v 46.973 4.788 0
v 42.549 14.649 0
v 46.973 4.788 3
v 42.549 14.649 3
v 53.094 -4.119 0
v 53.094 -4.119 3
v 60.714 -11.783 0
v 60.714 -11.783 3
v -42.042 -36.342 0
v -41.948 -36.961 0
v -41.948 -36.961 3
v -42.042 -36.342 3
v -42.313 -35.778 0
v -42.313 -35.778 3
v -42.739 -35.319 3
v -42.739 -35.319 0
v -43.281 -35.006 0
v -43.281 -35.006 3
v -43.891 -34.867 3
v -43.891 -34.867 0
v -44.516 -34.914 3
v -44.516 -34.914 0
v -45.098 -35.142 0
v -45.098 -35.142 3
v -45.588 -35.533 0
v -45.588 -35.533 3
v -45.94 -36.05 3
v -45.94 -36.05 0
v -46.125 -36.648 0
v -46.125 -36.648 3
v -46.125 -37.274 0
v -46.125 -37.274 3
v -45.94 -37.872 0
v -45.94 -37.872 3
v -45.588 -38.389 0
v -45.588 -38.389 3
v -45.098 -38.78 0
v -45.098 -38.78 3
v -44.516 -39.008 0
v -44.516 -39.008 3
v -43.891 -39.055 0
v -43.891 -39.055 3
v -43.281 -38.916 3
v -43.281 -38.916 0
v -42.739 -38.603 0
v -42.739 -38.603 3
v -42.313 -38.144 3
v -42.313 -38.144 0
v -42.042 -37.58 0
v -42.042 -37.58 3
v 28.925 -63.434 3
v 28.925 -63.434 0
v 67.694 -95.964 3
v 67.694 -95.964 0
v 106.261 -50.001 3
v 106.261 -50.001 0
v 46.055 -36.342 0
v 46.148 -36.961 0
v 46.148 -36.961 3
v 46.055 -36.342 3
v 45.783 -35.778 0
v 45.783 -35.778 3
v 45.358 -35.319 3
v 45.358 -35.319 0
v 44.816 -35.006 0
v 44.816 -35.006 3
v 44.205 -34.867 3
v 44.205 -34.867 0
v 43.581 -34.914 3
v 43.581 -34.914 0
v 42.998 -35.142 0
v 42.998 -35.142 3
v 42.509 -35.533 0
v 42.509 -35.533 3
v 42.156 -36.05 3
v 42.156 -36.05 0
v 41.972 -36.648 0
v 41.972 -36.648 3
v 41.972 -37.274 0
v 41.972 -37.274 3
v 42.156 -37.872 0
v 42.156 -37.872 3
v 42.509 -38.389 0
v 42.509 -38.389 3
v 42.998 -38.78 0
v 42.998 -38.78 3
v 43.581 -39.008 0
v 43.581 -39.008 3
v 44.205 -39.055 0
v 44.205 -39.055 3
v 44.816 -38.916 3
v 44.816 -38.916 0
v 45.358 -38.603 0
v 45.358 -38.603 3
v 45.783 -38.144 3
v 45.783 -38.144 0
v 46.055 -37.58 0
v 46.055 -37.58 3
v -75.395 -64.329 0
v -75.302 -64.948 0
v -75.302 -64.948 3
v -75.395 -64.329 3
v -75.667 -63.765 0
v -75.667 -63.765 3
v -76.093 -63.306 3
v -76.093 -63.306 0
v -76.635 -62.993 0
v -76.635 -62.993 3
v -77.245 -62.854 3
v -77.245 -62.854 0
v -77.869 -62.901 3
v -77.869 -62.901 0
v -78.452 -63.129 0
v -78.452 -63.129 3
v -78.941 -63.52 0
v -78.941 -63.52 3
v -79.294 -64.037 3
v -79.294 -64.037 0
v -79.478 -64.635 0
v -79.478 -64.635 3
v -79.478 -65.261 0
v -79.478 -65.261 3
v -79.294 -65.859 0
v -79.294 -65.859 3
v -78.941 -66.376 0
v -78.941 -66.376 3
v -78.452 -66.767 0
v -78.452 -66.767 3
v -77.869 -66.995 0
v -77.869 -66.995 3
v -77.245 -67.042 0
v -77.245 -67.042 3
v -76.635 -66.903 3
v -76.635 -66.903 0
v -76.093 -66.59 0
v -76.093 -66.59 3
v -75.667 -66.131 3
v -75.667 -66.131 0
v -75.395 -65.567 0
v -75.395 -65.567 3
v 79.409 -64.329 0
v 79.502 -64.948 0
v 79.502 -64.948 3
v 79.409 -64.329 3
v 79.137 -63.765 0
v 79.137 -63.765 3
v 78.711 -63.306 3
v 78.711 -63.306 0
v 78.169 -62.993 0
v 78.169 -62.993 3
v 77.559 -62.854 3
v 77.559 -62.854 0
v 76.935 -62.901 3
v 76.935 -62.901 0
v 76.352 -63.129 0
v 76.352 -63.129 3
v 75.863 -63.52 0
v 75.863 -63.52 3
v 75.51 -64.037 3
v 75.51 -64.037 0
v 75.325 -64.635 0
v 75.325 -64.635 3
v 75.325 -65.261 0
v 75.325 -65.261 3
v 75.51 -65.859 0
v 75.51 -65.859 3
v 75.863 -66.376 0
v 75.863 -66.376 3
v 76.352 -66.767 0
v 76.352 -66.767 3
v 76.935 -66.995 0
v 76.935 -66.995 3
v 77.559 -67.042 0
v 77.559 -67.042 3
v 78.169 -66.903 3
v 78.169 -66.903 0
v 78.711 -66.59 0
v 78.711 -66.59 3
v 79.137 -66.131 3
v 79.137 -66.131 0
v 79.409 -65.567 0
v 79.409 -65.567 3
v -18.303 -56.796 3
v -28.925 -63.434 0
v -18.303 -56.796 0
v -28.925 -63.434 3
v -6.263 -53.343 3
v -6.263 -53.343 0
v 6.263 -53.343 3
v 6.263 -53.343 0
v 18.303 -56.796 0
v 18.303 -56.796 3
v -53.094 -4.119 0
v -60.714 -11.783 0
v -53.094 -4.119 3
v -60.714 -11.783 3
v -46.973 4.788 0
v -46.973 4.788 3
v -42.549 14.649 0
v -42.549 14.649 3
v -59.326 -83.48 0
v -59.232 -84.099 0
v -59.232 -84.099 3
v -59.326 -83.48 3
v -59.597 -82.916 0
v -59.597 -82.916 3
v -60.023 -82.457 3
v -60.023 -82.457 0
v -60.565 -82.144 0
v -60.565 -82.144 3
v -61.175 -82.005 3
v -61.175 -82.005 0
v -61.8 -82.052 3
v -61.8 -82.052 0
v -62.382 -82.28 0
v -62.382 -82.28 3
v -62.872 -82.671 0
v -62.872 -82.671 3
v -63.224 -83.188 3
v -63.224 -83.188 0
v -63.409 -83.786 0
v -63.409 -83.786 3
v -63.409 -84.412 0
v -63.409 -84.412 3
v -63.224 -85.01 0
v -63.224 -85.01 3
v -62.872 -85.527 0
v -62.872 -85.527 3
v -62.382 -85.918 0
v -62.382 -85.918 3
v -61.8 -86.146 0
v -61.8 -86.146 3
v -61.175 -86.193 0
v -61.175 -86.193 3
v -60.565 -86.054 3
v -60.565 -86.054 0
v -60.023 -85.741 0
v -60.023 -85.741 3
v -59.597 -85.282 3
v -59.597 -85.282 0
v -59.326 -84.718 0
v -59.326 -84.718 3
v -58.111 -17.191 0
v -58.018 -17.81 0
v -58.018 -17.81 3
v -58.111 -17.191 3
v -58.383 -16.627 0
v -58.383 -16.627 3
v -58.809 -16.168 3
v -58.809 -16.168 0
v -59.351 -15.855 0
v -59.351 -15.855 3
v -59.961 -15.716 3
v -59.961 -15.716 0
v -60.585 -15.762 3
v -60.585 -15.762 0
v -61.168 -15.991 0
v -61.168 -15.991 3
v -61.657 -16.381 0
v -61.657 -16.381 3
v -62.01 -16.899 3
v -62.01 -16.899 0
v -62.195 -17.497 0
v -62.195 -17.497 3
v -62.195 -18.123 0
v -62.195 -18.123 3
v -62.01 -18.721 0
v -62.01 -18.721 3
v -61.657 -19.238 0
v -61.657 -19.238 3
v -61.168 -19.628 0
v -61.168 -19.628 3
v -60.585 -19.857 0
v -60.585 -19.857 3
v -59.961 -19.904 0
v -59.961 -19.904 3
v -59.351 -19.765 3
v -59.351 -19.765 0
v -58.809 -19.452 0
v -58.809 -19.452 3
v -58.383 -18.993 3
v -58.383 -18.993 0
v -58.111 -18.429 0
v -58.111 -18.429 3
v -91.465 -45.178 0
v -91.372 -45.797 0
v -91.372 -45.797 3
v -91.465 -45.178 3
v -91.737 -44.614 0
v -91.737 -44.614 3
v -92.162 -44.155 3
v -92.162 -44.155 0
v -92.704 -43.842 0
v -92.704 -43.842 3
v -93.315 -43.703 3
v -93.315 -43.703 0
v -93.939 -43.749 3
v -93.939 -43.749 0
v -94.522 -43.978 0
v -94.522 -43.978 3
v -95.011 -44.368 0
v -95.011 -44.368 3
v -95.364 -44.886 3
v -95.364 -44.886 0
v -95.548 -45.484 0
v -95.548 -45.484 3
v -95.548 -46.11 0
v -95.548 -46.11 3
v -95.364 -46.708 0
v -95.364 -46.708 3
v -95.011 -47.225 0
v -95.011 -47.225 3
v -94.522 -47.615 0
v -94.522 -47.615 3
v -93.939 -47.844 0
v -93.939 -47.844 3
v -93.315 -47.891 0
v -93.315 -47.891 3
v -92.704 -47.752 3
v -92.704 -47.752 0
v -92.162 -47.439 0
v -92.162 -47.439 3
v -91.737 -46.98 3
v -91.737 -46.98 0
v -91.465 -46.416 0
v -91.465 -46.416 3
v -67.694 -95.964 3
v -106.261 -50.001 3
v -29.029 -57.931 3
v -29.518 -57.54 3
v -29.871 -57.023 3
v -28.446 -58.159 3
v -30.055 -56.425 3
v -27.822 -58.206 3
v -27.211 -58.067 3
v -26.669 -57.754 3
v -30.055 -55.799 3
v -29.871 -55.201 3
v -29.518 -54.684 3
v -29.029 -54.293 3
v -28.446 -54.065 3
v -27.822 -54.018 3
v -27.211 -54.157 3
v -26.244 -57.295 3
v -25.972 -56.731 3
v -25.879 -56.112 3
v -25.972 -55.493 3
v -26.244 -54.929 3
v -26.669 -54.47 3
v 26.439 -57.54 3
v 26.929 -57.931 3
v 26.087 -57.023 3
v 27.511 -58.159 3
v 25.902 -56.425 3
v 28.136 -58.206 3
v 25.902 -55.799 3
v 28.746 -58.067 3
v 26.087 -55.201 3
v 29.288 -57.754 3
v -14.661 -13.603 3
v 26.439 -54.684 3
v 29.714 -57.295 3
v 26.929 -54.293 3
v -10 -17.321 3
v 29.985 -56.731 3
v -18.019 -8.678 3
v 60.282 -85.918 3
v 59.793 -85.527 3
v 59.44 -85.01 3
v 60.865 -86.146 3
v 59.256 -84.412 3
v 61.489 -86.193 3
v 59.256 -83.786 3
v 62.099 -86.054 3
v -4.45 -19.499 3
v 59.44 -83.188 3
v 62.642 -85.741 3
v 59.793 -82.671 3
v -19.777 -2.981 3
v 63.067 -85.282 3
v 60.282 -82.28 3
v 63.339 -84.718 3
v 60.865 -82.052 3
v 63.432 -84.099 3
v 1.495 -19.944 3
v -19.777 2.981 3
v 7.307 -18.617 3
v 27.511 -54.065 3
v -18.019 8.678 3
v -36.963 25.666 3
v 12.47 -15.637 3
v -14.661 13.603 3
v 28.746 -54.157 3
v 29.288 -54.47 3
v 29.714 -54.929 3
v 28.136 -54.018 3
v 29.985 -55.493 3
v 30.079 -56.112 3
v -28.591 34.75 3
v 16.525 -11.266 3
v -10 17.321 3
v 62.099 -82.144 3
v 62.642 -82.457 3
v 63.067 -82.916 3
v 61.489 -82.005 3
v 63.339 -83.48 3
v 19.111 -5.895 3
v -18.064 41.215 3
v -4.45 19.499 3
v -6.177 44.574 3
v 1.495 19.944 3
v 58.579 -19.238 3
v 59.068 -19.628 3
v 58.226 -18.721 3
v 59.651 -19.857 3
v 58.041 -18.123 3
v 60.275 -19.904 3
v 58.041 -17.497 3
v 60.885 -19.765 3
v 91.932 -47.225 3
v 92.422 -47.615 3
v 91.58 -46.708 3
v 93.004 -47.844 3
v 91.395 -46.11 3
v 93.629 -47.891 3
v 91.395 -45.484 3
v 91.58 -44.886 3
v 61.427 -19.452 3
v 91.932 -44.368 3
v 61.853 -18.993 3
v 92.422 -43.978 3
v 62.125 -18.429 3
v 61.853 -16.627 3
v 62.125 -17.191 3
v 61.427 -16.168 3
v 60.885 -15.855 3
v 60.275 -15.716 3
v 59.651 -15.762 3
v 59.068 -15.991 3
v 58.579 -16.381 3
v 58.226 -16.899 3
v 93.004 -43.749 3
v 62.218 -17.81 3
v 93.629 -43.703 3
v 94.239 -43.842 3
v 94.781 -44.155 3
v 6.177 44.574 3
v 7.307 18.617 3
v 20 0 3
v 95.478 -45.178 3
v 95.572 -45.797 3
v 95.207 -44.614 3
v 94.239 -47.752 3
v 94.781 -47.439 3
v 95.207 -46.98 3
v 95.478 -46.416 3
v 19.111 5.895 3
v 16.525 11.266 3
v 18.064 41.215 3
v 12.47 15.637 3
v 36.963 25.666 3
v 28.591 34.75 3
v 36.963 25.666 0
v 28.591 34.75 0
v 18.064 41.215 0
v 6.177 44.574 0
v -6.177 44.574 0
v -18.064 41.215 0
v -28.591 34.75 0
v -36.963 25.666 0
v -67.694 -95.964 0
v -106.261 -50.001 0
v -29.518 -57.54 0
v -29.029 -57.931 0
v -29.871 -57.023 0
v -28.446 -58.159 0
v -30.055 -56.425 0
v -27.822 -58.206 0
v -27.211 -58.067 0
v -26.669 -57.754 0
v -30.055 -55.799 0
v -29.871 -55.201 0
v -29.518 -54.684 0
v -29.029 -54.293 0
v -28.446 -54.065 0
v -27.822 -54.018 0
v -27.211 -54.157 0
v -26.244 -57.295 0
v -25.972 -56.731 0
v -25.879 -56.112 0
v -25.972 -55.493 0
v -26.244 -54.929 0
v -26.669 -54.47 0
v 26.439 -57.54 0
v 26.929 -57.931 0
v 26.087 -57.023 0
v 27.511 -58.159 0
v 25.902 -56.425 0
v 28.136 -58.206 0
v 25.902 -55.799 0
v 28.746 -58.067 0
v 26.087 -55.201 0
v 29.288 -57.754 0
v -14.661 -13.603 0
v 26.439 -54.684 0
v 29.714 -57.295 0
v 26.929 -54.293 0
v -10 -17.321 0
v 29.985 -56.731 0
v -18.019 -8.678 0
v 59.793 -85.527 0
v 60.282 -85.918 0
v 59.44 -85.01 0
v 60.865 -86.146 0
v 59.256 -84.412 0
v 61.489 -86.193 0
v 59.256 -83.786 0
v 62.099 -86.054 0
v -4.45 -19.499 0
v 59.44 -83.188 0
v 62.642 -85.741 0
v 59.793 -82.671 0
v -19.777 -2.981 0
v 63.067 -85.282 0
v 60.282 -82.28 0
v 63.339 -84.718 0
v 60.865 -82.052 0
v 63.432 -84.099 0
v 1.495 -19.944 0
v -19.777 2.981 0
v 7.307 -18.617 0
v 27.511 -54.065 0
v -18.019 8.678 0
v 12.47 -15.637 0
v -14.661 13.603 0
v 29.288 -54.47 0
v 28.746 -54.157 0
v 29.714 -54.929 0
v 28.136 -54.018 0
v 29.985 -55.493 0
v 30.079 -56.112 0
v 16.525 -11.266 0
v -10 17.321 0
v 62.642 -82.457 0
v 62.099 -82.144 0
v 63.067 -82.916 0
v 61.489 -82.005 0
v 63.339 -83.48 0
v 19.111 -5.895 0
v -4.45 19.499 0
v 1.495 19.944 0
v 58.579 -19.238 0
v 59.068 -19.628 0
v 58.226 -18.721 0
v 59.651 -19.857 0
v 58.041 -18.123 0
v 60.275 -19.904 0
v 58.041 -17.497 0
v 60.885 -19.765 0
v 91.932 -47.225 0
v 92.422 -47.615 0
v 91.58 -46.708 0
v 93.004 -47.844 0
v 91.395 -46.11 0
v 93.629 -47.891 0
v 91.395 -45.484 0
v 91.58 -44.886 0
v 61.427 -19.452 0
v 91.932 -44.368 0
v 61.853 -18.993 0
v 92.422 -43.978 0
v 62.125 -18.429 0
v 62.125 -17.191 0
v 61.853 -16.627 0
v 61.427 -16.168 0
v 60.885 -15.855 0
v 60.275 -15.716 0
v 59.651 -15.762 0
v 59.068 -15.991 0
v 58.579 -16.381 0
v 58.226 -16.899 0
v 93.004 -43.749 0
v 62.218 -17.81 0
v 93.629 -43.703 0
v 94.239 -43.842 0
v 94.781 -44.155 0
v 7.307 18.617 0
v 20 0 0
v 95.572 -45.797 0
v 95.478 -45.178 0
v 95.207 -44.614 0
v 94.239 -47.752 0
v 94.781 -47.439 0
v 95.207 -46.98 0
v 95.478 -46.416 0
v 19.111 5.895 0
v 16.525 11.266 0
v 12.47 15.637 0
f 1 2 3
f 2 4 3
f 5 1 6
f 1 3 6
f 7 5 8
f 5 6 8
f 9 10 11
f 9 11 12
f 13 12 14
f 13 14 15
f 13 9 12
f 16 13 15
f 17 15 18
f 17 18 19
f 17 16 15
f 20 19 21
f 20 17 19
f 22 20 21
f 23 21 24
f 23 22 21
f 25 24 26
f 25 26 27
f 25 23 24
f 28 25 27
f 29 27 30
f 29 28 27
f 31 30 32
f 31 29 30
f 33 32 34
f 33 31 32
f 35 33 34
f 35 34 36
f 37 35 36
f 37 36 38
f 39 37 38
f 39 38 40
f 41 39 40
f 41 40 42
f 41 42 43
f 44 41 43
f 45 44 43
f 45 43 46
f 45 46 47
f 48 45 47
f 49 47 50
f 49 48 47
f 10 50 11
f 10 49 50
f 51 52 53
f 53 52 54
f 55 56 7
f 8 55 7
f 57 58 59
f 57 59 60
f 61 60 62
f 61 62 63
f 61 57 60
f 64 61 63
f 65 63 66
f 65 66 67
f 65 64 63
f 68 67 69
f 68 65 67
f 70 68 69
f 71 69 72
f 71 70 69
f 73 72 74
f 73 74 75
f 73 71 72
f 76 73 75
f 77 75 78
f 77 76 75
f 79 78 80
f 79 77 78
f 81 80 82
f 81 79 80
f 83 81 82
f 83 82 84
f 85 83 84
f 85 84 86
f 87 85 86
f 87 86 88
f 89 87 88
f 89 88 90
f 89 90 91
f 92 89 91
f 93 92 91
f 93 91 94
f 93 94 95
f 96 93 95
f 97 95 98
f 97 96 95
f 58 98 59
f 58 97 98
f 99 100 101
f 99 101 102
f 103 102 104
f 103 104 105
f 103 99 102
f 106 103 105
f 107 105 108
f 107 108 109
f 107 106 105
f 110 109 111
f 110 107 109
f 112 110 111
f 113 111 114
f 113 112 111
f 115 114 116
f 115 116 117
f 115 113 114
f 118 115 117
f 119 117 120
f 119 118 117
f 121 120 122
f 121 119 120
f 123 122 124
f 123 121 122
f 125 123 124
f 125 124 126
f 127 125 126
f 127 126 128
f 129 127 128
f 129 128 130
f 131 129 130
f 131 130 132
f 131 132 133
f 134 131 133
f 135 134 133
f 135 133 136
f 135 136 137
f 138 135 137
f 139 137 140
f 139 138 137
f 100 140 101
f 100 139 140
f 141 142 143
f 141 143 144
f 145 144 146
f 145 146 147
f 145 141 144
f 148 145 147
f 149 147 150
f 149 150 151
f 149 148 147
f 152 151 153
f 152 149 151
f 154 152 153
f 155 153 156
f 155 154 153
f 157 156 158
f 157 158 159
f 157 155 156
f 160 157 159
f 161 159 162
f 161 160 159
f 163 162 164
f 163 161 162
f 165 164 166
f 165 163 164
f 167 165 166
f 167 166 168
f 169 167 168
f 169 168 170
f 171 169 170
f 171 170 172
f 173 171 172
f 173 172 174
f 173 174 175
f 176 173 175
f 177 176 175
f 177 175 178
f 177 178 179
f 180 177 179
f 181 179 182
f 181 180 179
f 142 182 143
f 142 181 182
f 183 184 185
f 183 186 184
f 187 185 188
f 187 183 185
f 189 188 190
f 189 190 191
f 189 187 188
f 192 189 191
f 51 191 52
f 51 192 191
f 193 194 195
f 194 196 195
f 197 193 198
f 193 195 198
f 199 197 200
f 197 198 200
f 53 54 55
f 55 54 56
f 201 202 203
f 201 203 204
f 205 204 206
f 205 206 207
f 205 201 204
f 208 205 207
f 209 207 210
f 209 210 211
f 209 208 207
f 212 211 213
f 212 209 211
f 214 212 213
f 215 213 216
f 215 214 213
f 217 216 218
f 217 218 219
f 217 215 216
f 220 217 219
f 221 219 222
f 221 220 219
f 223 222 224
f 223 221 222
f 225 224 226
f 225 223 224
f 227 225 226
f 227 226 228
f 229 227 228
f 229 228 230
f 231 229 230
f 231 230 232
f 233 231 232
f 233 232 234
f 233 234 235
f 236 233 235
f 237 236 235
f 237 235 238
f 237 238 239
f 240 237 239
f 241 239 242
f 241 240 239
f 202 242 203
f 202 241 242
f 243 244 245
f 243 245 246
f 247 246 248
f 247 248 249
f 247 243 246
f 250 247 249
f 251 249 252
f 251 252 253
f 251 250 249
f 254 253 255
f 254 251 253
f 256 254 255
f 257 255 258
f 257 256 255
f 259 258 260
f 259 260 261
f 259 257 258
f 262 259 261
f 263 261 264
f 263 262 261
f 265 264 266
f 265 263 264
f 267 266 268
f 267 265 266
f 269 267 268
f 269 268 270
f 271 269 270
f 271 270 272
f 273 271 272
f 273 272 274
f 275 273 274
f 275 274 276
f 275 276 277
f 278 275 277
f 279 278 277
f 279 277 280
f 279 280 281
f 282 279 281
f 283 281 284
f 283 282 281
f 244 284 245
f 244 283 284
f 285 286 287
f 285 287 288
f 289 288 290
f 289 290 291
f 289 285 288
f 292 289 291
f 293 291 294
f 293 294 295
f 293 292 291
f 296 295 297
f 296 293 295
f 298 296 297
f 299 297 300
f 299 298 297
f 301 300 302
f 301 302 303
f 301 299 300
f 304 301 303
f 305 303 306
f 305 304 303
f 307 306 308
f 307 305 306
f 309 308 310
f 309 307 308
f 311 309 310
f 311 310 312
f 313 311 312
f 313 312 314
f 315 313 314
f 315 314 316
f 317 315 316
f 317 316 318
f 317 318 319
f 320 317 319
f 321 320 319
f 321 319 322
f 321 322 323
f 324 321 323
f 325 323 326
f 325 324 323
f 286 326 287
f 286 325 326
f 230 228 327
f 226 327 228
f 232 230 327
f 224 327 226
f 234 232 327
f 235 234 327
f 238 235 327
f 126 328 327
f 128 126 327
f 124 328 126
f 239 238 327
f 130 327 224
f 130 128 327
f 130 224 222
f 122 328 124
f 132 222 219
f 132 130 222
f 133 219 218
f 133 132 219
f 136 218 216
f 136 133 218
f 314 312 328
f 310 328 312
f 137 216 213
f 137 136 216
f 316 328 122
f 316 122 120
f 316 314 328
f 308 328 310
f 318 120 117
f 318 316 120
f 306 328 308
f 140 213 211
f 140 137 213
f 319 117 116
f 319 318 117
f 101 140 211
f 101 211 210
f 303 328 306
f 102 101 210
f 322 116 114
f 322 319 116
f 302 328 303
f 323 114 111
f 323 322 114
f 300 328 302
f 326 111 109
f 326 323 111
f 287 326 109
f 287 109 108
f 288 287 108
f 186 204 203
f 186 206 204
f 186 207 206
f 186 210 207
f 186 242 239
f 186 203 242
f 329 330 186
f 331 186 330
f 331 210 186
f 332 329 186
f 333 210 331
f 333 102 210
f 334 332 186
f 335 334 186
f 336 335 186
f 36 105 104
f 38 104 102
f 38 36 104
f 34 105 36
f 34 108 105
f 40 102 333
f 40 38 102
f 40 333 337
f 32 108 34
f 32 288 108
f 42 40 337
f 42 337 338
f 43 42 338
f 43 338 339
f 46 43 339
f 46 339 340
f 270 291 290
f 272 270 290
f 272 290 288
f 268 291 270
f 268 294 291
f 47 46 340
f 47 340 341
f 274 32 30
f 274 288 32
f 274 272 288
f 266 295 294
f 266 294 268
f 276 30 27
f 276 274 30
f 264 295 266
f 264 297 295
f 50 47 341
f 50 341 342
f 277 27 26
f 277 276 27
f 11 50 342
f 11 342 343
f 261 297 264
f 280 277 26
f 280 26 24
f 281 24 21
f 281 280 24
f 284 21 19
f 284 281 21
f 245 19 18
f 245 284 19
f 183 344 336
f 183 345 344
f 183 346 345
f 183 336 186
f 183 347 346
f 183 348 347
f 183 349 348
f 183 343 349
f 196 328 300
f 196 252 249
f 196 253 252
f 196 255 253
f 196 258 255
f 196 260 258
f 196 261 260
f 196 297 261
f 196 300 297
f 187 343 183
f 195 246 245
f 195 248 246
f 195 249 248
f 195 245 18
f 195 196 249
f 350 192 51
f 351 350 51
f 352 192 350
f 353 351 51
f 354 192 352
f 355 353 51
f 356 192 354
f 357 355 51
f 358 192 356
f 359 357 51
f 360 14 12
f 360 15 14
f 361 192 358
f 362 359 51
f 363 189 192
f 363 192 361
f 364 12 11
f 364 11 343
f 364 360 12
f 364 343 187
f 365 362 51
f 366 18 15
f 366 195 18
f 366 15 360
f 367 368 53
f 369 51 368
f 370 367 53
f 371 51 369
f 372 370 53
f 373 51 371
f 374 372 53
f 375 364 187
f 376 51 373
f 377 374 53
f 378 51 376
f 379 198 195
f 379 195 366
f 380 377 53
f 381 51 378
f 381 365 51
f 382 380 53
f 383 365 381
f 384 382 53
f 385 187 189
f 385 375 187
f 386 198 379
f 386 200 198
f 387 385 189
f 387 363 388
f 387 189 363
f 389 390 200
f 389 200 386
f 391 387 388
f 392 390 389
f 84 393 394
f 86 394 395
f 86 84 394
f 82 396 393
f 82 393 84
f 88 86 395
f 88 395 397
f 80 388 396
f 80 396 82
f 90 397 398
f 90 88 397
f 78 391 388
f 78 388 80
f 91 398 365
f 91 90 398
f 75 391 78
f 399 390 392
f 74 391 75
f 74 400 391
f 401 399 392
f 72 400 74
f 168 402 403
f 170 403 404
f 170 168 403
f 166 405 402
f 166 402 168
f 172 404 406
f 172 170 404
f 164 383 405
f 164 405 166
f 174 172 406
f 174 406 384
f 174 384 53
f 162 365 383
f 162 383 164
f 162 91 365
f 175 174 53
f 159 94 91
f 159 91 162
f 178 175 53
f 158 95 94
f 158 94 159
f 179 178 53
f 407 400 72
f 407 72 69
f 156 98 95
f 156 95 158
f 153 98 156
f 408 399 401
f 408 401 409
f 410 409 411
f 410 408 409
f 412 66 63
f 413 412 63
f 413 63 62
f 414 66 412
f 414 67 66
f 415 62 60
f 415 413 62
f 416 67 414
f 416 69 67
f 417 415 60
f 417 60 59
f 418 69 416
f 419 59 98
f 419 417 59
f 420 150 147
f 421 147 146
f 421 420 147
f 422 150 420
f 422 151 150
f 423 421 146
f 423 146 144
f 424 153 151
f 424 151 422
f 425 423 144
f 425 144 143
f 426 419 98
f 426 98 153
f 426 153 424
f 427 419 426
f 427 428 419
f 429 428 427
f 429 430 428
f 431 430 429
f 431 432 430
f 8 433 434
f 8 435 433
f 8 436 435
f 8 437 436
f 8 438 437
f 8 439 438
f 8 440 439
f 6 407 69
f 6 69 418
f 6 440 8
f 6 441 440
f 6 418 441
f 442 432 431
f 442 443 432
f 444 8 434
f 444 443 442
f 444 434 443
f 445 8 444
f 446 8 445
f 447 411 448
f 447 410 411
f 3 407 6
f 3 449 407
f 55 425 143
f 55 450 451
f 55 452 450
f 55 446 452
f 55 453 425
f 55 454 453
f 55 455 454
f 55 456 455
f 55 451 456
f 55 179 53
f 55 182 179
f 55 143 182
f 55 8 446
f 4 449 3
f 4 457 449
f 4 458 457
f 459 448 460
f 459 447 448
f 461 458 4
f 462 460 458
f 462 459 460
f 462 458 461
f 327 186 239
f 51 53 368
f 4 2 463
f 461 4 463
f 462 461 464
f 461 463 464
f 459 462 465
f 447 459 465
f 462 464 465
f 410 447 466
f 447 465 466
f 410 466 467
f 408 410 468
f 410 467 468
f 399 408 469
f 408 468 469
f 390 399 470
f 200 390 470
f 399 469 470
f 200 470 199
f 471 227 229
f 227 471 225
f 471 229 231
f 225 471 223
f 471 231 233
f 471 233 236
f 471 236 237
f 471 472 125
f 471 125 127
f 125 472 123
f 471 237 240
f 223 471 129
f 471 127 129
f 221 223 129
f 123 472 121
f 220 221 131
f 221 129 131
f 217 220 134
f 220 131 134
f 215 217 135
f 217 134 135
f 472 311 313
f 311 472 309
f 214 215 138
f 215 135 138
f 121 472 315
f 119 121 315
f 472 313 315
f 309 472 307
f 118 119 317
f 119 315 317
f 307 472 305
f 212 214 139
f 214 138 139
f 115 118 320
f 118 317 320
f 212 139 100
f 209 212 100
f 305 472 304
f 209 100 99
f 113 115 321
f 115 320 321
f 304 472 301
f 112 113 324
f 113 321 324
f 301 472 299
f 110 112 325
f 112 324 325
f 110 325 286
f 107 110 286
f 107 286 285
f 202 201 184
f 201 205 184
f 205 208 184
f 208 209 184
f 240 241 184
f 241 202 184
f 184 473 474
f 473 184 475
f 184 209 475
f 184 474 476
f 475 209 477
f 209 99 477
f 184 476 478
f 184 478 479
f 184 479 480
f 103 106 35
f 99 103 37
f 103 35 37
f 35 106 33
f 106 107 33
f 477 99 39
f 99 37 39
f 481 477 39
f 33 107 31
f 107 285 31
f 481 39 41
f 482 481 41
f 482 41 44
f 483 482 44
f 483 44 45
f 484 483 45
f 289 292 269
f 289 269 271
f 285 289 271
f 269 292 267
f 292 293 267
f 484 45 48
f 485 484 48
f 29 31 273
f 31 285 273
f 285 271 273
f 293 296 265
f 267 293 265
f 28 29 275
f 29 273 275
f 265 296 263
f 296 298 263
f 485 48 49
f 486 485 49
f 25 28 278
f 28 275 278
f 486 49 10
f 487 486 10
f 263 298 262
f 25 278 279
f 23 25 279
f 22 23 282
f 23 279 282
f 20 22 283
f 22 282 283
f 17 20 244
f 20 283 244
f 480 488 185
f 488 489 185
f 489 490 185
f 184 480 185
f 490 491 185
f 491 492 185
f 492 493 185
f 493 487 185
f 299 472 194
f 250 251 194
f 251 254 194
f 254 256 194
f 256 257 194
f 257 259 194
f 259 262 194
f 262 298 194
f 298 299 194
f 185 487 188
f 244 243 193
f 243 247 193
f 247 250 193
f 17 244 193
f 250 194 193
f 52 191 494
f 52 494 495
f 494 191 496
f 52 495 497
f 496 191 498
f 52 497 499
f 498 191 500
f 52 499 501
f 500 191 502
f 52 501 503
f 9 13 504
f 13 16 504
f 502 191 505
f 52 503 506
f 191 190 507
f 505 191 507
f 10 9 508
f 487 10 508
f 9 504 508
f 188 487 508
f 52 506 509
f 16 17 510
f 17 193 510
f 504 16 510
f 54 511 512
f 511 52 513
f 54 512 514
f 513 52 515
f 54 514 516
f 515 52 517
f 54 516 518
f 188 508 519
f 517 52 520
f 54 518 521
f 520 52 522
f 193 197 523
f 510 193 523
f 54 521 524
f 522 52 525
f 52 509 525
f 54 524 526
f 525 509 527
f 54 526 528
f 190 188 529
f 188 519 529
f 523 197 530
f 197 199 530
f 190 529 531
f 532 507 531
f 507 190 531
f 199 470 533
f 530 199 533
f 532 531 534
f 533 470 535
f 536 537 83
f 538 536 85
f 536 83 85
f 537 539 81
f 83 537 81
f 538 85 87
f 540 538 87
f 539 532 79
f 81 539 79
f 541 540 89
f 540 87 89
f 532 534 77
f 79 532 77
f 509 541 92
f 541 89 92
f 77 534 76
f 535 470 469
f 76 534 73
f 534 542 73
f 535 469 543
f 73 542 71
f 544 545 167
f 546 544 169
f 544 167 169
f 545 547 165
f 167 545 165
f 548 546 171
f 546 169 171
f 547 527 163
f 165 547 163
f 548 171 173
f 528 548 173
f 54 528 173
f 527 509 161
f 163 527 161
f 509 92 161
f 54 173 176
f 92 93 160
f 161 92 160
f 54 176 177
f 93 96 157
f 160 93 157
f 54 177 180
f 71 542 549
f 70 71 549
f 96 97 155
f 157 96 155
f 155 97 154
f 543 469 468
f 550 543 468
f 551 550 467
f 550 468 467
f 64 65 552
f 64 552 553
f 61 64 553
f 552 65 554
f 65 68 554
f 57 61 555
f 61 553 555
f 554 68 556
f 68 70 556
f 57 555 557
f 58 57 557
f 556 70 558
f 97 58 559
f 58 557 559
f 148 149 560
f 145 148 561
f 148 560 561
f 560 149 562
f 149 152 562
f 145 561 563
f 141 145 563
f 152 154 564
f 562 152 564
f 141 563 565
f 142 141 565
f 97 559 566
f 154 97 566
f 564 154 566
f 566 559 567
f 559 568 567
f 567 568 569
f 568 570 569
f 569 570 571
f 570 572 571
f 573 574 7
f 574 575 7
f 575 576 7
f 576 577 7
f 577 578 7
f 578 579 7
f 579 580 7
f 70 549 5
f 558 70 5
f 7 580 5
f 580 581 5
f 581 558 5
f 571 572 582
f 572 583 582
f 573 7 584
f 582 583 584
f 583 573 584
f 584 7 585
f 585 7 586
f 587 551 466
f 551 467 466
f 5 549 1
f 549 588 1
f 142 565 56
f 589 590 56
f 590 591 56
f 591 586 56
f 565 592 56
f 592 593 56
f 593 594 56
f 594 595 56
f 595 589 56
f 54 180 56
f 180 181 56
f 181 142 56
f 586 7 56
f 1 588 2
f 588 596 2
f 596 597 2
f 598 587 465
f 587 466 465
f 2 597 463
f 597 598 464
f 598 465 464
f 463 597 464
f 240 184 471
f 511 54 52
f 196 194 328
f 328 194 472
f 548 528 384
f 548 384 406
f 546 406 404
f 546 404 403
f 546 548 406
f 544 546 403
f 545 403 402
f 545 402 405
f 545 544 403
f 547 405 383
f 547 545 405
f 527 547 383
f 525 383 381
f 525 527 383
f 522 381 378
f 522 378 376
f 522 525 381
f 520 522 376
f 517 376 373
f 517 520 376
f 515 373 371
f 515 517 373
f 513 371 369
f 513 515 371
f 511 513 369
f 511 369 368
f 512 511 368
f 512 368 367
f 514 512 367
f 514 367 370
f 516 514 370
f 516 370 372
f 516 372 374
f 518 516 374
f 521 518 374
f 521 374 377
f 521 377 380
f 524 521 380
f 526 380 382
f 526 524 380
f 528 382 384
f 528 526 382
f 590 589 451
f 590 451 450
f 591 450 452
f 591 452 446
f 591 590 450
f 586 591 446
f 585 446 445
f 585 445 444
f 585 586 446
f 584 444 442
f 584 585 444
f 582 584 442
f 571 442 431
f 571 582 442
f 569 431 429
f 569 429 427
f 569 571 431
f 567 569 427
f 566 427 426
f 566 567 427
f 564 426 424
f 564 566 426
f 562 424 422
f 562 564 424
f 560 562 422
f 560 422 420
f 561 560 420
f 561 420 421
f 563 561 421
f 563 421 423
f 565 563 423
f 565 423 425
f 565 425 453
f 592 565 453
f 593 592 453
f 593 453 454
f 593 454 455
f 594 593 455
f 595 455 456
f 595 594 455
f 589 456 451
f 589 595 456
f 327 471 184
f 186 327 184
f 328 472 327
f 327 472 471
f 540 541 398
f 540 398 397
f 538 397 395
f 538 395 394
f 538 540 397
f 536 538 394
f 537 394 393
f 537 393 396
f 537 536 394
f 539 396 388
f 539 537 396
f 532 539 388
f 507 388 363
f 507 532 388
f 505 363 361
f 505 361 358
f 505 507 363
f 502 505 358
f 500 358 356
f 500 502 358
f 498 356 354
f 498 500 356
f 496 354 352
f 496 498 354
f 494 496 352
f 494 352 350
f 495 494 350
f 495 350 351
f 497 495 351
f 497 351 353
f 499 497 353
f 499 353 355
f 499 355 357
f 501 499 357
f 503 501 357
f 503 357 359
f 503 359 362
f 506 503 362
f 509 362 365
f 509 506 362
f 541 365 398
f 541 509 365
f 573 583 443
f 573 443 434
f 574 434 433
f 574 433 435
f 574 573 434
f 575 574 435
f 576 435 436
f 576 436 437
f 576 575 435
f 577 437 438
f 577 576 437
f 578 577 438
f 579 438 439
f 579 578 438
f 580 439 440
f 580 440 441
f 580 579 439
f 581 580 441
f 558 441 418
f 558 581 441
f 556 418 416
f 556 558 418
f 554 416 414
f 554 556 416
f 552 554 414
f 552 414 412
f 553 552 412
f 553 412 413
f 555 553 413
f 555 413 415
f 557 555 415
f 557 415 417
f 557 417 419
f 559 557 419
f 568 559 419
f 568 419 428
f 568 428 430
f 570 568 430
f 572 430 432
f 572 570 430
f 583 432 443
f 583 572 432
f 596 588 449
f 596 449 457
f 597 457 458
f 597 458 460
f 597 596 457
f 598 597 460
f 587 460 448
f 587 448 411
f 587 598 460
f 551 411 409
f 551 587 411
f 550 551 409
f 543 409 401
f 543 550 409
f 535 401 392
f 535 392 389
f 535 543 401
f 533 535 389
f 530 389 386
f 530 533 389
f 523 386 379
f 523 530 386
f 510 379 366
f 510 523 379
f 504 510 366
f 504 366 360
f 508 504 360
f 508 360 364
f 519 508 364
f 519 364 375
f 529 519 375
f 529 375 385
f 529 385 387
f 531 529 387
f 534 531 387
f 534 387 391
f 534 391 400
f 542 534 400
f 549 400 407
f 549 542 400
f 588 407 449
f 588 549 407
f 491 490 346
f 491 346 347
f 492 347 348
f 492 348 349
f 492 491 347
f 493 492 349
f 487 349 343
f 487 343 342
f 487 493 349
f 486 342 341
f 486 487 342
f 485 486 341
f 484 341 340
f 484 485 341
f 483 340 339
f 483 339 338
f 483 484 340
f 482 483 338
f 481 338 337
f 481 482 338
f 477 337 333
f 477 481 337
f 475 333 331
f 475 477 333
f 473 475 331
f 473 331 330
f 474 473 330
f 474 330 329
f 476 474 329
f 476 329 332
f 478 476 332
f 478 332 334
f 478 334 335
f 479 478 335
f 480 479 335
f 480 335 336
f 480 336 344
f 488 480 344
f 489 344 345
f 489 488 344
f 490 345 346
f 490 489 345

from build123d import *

# Parameters (mm, degrees)
SKETCH1_R           = 2.1
SKETCH1_R_2         = 20
BOSS_EXTRUDE1_DEPTH = 3
FILLET1_R           = 60
FILLET3_R           = 45


with BuildPart() as part:
    # Sketch1 → Boss-Extrude1 (new body)
    with BuildSketch(Plane.XY):
        with BuildLine():
            Line((-106.261095469, -50.001427337), (-67.693838888, -95.964093924))
            Line((-67.693838888, -95.964093924), (0, -39.16221868))
            Line((0, -39.16221868), (67.693838888, -95.964093924))
            Line((67.693838888, -95.964093924), (106.261095469, -50.001427337))
            Line((106.261095469, -50.001427337), (44.97754002, 1.421581438))
            ThreePointArc((44.97754002, 1.421581438), (0, 45), (-44.97754002, 1.421581438))
            Line((-44.97754002, 1.421581438), (-106.261095469, -50.001427337))
        make_face()
        with Locations((-61.332221397, -84.099026587)):
            Circle(SKETCH1_R, mode=Mode.SUBTRACT)
        with Locations((-77.40191164, -64.947915509)):
            Circle(SKETCH1_R, mode=Mode.SUBTRACT)
        with Locations((-93.471601882, -45.796804431)):
            Circle(SKETCH1_R, mode=Mode.SUBTRACT)
        with Locations((-27.978646344, -56.112054061)):
            Circle(SKETCH1_R, mode=Mode.SUBTRACT)
        with Locations((-44.048336586, -36.960942983)):
            Circle(SKETCH1_R, mode=Mode.SUBTRACT)
        with Locations((-60.118026828, -17.809831905)):
            Circle(SKETCH1_R, mode=Mode.SUBTRACT)
        Circle(SKETCH1_R_2, mode=Mode.SUBTRACT)
        with Locations((60.118026828, -17.809831905)):
            Circle(SKETCH1_R, mode=Mode.SUBTRACT)
        with Locations((61.332221397, -84.099026587)):
            Circle(SKETCH1_R, mode=Mode.SUBTRACT)
        with Locations((77.40191164, -64.947915509)):
            Circle(SKETCH1_R, mode=Mode.SUBTRACT)
        with Locations((27.978646344, -56.112054061)):
            Circle(SKETCH1_R, mode=Mode.SUBTRACT)
        with Locations((44.048336586, -36.960942983)):
            Circle(SKETCH1_R, mode=Mode.SUBTRACT)
        with Locations((93.471601882, -45.796804431)):
            Circle(SKETCH1_R, mode=Mode.SUBTRACT)
    extrude(amount=BOSS_EXTRUDE1_DEPTH)

    # Fillet1
    fillet1_edges = [part.edges().sort_by_distance(p)[0] for p in [
        (44.97754002, 1.421581438, 1.5),
        (-44.97754002, 1.421581438, 1.5),
    ]]
    fillet(fillet1_edges, radius=FILLET1_R)

    # Fillet3
    fillet3_edges = [part.edges().sort_by_distance(p)[0] for p in [
        (0, -39.16221868, 1.5),
    ]]
    fillet(fillet3_edges, radius=FILLET3_R)


solid = part.part
